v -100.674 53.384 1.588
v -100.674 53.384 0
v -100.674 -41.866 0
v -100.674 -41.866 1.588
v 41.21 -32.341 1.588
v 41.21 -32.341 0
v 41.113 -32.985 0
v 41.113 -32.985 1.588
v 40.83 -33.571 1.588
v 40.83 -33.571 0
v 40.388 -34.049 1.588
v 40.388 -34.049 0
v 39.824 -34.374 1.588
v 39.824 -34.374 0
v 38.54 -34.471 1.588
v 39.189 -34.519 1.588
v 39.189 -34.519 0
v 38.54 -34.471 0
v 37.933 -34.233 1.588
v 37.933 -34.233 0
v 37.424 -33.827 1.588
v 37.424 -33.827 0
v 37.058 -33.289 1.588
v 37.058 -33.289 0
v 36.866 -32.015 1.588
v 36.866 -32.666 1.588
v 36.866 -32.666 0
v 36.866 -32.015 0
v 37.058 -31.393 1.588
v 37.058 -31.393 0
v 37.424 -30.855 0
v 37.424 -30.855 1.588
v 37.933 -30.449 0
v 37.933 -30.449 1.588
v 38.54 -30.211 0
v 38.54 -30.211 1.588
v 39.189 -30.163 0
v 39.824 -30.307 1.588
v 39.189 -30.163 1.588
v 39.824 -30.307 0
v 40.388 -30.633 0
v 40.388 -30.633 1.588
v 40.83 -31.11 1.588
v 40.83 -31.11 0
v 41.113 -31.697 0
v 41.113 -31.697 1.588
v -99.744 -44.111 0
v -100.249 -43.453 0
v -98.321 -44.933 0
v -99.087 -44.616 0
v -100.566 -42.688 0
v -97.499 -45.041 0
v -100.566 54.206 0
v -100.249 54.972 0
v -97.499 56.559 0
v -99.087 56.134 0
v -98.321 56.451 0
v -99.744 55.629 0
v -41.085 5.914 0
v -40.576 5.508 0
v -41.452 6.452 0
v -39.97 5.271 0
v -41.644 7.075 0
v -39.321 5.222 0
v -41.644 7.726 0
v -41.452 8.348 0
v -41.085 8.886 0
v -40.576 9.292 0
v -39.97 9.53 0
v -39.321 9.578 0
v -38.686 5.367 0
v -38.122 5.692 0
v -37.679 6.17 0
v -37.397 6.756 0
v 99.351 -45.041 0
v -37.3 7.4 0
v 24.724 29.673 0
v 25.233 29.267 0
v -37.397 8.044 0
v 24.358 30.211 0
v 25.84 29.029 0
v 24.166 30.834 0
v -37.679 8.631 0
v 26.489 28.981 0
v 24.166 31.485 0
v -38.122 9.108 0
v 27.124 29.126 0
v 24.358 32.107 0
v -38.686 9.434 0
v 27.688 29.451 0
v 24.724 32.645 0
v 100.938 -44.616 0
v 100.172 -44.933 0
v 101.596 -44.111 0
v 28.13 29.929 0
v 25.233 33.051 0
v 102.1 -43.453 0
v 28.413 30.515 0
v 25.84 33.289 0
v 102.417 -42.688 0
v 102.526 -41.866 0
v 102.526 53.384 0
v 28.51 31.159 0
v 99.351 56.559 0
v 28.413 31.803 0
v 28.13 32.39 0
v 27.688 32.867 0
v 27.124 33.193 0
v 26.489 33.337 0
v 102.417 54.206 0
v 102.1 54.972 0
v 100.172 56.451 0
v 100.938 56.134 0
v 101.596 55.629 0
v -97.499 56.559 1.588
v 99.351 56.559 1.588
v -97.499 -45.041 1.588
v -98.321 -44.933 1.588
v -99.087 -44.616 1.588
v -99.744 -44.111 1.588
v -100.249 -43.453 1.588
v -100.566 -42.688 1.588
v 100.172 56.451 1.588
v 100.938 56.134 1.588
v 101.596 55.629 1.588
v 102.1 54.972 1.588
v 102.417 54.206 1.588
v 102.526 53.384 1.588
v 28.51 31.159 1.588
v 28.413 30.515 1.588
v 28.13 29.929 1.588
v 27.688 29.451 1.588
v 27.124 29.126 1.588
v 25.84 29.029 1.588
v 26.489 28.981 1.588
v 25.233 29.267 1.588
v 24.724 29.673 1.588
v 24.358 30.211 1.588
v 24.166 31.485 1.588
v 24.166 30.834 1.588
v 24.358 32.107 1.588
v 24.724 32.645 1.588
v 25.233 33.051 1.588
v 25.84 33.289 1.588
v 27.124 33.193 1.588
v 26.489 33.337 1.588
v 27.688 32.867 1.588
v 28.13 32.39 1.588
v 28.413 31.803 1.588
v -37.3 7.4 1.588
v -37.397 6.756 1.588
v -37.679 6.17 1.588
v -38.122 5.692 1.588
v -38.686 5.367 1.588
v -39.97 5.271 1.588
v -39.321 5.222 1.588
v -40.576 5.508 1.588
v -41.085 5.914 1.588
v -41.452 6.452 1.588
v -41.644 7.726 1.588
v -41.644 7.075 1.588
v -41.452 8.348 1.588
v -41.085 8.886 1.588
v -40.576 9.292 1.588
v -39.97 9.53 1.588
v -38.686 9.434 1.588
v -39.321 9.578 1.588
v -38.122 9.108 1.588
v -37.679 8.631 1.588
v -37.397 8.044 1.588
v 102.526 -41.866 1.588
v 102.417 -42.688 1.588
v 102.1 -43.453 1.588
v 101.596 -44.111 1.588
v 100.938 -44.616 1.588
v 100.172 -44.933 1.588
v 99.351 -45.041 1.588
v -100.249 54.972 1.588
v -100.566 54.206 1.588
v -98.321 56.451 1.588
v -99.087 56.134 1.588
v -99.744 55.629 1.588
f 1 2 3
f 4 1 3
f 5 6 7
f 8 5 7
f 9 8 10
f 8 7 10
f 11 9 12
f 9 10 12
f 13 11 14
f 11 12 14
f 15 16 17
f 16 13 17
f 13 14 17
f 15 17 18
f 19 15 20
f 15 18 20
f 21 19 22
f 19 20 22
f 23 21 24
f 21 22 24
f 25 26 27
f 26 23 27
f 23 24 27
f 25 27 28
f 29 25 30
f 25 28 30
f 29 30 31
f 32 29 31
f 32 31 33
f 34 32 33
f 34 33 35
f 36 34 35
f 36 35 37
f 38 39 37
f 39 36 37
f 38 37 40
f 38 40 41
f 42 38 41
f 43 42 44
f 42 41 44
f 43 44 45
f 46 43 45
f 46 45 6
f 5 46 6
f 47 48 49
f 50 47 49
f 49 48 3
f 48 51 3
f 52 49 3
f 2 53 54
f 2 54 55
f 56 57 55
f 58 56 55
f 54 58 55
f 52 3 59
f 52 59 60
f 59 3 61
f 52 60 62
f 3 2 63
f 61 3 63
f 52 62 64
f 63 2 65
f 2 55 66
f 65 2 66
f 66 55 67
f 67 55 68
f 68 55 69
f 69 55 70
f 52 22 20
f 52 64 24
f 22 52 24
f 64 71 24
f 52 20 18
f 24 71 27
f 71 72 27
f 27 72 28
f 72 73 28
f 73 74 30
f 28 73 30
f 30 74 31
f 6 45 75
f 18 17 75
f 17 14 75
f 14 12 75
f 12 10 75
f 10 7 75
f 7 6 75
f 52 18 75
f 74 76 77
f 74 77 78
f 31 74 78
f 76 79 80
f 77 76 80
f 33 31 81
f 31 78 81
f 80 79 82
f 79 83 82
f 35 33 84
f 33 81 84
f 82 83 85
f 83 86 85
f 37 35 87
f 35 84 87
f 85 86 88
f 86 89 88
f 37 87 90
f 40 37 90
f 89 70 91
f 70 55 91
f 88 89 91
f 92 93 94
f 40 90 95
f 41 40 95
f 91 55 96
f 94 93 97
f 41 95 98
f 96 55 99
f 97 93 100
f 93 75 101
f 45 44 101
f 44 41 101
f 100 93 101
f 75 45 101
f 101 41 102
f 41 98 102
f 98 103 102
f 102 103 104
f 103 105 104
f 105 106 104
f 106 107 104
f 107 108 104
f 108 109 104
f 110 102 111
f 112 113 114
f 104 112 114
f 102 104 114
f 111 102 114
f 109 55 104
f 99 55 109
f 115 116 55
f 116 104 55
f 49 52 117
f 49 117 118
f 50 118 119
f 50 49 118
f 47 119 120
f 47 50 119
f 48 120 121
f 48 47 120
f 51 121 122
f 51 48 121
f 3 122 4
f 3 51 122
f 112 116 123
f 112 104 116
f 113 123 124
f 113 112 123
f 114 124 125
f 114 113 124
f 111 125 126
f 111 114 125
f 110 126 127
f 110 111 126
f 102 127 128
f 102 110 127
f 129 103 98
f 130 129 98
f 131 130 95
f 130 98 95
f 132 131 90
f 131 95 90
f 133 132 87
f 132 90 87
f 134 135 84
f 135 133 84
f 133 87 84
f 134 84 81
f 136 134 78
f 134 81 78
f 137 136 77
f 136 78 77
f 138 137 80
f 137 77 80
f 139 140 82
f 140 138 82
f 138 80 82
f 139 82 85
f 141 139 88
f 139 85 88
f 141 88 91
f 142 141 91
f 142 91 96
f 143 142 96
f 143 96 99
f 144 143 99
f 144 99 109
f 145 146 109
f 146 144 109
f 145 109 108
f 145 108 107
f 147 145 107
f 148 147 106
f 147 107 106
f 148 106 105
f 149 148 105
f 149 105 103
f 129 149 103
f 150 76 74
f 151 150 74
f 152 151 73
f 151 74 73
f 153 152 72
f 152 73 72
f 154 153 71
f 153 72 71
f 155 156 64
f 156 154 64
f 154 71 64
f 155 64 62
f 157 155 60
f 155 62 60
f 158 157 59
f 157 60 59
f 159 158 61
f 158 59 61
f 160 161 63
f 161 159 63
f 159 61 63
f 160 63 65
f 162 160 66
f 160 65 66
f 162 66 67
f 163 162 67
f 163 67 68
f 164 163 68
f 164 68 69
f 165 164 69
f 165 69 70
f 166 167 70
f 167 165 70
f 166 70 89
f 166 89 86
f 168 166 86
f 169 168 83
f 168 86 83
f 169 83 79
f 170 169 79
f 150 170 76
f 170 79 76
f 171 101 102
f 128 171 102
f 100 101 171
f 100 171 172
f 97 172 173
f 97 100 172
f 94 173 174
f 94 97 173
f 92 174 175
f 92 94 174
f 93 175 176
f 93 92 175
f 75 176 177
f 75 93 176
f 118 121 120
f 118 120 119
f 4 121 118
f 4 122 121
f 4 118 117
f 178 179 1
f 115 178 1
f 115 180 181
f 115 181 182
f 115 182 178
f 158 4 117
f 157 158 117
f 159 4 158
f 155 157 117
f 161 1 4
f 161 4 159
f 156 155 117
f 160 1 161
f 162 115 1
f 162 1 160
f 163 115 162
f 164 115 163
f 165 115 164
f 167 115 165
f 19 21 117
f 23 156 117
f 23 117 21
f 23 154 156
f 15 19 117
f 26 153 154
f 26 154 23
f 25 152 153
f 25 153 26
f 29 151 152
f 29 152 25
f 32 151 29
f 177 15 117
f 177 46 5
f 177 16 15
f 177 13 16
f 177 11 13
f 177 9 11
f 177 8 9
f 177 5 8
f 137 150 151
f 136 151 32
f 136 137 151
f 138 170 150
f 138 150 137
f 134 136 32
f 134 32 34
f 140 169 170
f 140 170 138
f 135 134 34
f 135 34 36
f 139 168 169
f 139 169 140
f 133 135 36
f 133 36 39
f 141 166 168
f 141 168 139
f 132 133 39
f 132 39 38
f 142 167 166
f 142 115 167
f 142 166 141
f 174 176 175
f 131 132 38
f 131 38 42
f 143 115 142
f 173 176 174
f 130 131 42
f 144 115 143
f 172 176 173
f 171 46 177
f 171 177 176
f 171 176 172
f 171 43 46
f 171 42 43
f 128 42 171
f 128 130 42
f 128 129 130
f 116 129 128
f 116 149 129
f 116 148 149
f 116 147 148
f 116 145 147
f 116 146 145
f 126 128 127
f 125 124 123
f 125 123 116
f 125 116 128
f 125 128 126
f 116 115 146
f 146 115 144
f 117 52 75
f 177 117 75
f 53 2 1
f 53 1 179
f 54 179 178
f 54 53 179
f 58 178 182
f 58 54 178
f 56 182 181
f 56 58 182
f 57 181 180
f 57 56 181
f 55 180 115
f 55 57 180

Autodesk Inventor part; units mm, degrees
ref_plane "YZ Plane" through (0, 0, 0) normal (1, 0, 0) x (0, 1, 0)
ref_plane "XZ Plane" through (0, 0, 0) normal (0, 1, 0) x (-1, 0, 0)
ref_plane "XY Plane" through (0, 0, 0) normal (0, 0, 1) x (1, 0, 0)
sketch "Sketch1" plane through (0, 0, 0) normal (0, 0, 1) x (1, 0, 0)
  line L0 (99.3506, 56.5591) -> (-97.4994, 56.5591)
  line L1 (-100.6744, 53.3841) -> (-100.6744, -41.8659)
  line L2 (-97.4994, -45.0409) -> (99.3506, -45.0409)
  line L3 (102.5256, -41.8659) -> (102.5256, 53.3841)
  circle A0 centre (26.3256, 31.1591) radius 2.1844
  circle A1 centre (-39.484, 7.4002) radius 2.1844
  circle A2 centre (39.0256, -32.3409) radius 2.1844
  arc A3 (99.3506, -45.0409) -> (102.5256, -41.8659) centre (99.3506, -41.8659) ccw
  arc A4 (102.5256, 53.3841) -> (99.3506, 56.5591) centre (99.3506, 53.3841) ccw
  arc A5 (-97.4994, 56.5591) -> (-100.6744, 53.3841) centre (-97.4994, 53.3841) ccw
  arc A6 (-100.6744, -41.8659) -> (-97.4994, -45.0409) centre (-97.4994, -41.8659) ccw
  point P0 (0, 0)
  point P1 (-100.6744, -45.0409)
  point P2 (-100.6744, 56.5591)
  point P3 (102.5256, -45.0409)
  dimension "d0" = 203.2
  dimension "d1" = 101.6
  dimension "d2" = 25.4
  dimension "d3" = 76.2
  dimension "d4" = 3.175
extrude "Extrusion1" add sketch "Sketch1" along normal blind 1.5875
properties part number "smalleraligner"
